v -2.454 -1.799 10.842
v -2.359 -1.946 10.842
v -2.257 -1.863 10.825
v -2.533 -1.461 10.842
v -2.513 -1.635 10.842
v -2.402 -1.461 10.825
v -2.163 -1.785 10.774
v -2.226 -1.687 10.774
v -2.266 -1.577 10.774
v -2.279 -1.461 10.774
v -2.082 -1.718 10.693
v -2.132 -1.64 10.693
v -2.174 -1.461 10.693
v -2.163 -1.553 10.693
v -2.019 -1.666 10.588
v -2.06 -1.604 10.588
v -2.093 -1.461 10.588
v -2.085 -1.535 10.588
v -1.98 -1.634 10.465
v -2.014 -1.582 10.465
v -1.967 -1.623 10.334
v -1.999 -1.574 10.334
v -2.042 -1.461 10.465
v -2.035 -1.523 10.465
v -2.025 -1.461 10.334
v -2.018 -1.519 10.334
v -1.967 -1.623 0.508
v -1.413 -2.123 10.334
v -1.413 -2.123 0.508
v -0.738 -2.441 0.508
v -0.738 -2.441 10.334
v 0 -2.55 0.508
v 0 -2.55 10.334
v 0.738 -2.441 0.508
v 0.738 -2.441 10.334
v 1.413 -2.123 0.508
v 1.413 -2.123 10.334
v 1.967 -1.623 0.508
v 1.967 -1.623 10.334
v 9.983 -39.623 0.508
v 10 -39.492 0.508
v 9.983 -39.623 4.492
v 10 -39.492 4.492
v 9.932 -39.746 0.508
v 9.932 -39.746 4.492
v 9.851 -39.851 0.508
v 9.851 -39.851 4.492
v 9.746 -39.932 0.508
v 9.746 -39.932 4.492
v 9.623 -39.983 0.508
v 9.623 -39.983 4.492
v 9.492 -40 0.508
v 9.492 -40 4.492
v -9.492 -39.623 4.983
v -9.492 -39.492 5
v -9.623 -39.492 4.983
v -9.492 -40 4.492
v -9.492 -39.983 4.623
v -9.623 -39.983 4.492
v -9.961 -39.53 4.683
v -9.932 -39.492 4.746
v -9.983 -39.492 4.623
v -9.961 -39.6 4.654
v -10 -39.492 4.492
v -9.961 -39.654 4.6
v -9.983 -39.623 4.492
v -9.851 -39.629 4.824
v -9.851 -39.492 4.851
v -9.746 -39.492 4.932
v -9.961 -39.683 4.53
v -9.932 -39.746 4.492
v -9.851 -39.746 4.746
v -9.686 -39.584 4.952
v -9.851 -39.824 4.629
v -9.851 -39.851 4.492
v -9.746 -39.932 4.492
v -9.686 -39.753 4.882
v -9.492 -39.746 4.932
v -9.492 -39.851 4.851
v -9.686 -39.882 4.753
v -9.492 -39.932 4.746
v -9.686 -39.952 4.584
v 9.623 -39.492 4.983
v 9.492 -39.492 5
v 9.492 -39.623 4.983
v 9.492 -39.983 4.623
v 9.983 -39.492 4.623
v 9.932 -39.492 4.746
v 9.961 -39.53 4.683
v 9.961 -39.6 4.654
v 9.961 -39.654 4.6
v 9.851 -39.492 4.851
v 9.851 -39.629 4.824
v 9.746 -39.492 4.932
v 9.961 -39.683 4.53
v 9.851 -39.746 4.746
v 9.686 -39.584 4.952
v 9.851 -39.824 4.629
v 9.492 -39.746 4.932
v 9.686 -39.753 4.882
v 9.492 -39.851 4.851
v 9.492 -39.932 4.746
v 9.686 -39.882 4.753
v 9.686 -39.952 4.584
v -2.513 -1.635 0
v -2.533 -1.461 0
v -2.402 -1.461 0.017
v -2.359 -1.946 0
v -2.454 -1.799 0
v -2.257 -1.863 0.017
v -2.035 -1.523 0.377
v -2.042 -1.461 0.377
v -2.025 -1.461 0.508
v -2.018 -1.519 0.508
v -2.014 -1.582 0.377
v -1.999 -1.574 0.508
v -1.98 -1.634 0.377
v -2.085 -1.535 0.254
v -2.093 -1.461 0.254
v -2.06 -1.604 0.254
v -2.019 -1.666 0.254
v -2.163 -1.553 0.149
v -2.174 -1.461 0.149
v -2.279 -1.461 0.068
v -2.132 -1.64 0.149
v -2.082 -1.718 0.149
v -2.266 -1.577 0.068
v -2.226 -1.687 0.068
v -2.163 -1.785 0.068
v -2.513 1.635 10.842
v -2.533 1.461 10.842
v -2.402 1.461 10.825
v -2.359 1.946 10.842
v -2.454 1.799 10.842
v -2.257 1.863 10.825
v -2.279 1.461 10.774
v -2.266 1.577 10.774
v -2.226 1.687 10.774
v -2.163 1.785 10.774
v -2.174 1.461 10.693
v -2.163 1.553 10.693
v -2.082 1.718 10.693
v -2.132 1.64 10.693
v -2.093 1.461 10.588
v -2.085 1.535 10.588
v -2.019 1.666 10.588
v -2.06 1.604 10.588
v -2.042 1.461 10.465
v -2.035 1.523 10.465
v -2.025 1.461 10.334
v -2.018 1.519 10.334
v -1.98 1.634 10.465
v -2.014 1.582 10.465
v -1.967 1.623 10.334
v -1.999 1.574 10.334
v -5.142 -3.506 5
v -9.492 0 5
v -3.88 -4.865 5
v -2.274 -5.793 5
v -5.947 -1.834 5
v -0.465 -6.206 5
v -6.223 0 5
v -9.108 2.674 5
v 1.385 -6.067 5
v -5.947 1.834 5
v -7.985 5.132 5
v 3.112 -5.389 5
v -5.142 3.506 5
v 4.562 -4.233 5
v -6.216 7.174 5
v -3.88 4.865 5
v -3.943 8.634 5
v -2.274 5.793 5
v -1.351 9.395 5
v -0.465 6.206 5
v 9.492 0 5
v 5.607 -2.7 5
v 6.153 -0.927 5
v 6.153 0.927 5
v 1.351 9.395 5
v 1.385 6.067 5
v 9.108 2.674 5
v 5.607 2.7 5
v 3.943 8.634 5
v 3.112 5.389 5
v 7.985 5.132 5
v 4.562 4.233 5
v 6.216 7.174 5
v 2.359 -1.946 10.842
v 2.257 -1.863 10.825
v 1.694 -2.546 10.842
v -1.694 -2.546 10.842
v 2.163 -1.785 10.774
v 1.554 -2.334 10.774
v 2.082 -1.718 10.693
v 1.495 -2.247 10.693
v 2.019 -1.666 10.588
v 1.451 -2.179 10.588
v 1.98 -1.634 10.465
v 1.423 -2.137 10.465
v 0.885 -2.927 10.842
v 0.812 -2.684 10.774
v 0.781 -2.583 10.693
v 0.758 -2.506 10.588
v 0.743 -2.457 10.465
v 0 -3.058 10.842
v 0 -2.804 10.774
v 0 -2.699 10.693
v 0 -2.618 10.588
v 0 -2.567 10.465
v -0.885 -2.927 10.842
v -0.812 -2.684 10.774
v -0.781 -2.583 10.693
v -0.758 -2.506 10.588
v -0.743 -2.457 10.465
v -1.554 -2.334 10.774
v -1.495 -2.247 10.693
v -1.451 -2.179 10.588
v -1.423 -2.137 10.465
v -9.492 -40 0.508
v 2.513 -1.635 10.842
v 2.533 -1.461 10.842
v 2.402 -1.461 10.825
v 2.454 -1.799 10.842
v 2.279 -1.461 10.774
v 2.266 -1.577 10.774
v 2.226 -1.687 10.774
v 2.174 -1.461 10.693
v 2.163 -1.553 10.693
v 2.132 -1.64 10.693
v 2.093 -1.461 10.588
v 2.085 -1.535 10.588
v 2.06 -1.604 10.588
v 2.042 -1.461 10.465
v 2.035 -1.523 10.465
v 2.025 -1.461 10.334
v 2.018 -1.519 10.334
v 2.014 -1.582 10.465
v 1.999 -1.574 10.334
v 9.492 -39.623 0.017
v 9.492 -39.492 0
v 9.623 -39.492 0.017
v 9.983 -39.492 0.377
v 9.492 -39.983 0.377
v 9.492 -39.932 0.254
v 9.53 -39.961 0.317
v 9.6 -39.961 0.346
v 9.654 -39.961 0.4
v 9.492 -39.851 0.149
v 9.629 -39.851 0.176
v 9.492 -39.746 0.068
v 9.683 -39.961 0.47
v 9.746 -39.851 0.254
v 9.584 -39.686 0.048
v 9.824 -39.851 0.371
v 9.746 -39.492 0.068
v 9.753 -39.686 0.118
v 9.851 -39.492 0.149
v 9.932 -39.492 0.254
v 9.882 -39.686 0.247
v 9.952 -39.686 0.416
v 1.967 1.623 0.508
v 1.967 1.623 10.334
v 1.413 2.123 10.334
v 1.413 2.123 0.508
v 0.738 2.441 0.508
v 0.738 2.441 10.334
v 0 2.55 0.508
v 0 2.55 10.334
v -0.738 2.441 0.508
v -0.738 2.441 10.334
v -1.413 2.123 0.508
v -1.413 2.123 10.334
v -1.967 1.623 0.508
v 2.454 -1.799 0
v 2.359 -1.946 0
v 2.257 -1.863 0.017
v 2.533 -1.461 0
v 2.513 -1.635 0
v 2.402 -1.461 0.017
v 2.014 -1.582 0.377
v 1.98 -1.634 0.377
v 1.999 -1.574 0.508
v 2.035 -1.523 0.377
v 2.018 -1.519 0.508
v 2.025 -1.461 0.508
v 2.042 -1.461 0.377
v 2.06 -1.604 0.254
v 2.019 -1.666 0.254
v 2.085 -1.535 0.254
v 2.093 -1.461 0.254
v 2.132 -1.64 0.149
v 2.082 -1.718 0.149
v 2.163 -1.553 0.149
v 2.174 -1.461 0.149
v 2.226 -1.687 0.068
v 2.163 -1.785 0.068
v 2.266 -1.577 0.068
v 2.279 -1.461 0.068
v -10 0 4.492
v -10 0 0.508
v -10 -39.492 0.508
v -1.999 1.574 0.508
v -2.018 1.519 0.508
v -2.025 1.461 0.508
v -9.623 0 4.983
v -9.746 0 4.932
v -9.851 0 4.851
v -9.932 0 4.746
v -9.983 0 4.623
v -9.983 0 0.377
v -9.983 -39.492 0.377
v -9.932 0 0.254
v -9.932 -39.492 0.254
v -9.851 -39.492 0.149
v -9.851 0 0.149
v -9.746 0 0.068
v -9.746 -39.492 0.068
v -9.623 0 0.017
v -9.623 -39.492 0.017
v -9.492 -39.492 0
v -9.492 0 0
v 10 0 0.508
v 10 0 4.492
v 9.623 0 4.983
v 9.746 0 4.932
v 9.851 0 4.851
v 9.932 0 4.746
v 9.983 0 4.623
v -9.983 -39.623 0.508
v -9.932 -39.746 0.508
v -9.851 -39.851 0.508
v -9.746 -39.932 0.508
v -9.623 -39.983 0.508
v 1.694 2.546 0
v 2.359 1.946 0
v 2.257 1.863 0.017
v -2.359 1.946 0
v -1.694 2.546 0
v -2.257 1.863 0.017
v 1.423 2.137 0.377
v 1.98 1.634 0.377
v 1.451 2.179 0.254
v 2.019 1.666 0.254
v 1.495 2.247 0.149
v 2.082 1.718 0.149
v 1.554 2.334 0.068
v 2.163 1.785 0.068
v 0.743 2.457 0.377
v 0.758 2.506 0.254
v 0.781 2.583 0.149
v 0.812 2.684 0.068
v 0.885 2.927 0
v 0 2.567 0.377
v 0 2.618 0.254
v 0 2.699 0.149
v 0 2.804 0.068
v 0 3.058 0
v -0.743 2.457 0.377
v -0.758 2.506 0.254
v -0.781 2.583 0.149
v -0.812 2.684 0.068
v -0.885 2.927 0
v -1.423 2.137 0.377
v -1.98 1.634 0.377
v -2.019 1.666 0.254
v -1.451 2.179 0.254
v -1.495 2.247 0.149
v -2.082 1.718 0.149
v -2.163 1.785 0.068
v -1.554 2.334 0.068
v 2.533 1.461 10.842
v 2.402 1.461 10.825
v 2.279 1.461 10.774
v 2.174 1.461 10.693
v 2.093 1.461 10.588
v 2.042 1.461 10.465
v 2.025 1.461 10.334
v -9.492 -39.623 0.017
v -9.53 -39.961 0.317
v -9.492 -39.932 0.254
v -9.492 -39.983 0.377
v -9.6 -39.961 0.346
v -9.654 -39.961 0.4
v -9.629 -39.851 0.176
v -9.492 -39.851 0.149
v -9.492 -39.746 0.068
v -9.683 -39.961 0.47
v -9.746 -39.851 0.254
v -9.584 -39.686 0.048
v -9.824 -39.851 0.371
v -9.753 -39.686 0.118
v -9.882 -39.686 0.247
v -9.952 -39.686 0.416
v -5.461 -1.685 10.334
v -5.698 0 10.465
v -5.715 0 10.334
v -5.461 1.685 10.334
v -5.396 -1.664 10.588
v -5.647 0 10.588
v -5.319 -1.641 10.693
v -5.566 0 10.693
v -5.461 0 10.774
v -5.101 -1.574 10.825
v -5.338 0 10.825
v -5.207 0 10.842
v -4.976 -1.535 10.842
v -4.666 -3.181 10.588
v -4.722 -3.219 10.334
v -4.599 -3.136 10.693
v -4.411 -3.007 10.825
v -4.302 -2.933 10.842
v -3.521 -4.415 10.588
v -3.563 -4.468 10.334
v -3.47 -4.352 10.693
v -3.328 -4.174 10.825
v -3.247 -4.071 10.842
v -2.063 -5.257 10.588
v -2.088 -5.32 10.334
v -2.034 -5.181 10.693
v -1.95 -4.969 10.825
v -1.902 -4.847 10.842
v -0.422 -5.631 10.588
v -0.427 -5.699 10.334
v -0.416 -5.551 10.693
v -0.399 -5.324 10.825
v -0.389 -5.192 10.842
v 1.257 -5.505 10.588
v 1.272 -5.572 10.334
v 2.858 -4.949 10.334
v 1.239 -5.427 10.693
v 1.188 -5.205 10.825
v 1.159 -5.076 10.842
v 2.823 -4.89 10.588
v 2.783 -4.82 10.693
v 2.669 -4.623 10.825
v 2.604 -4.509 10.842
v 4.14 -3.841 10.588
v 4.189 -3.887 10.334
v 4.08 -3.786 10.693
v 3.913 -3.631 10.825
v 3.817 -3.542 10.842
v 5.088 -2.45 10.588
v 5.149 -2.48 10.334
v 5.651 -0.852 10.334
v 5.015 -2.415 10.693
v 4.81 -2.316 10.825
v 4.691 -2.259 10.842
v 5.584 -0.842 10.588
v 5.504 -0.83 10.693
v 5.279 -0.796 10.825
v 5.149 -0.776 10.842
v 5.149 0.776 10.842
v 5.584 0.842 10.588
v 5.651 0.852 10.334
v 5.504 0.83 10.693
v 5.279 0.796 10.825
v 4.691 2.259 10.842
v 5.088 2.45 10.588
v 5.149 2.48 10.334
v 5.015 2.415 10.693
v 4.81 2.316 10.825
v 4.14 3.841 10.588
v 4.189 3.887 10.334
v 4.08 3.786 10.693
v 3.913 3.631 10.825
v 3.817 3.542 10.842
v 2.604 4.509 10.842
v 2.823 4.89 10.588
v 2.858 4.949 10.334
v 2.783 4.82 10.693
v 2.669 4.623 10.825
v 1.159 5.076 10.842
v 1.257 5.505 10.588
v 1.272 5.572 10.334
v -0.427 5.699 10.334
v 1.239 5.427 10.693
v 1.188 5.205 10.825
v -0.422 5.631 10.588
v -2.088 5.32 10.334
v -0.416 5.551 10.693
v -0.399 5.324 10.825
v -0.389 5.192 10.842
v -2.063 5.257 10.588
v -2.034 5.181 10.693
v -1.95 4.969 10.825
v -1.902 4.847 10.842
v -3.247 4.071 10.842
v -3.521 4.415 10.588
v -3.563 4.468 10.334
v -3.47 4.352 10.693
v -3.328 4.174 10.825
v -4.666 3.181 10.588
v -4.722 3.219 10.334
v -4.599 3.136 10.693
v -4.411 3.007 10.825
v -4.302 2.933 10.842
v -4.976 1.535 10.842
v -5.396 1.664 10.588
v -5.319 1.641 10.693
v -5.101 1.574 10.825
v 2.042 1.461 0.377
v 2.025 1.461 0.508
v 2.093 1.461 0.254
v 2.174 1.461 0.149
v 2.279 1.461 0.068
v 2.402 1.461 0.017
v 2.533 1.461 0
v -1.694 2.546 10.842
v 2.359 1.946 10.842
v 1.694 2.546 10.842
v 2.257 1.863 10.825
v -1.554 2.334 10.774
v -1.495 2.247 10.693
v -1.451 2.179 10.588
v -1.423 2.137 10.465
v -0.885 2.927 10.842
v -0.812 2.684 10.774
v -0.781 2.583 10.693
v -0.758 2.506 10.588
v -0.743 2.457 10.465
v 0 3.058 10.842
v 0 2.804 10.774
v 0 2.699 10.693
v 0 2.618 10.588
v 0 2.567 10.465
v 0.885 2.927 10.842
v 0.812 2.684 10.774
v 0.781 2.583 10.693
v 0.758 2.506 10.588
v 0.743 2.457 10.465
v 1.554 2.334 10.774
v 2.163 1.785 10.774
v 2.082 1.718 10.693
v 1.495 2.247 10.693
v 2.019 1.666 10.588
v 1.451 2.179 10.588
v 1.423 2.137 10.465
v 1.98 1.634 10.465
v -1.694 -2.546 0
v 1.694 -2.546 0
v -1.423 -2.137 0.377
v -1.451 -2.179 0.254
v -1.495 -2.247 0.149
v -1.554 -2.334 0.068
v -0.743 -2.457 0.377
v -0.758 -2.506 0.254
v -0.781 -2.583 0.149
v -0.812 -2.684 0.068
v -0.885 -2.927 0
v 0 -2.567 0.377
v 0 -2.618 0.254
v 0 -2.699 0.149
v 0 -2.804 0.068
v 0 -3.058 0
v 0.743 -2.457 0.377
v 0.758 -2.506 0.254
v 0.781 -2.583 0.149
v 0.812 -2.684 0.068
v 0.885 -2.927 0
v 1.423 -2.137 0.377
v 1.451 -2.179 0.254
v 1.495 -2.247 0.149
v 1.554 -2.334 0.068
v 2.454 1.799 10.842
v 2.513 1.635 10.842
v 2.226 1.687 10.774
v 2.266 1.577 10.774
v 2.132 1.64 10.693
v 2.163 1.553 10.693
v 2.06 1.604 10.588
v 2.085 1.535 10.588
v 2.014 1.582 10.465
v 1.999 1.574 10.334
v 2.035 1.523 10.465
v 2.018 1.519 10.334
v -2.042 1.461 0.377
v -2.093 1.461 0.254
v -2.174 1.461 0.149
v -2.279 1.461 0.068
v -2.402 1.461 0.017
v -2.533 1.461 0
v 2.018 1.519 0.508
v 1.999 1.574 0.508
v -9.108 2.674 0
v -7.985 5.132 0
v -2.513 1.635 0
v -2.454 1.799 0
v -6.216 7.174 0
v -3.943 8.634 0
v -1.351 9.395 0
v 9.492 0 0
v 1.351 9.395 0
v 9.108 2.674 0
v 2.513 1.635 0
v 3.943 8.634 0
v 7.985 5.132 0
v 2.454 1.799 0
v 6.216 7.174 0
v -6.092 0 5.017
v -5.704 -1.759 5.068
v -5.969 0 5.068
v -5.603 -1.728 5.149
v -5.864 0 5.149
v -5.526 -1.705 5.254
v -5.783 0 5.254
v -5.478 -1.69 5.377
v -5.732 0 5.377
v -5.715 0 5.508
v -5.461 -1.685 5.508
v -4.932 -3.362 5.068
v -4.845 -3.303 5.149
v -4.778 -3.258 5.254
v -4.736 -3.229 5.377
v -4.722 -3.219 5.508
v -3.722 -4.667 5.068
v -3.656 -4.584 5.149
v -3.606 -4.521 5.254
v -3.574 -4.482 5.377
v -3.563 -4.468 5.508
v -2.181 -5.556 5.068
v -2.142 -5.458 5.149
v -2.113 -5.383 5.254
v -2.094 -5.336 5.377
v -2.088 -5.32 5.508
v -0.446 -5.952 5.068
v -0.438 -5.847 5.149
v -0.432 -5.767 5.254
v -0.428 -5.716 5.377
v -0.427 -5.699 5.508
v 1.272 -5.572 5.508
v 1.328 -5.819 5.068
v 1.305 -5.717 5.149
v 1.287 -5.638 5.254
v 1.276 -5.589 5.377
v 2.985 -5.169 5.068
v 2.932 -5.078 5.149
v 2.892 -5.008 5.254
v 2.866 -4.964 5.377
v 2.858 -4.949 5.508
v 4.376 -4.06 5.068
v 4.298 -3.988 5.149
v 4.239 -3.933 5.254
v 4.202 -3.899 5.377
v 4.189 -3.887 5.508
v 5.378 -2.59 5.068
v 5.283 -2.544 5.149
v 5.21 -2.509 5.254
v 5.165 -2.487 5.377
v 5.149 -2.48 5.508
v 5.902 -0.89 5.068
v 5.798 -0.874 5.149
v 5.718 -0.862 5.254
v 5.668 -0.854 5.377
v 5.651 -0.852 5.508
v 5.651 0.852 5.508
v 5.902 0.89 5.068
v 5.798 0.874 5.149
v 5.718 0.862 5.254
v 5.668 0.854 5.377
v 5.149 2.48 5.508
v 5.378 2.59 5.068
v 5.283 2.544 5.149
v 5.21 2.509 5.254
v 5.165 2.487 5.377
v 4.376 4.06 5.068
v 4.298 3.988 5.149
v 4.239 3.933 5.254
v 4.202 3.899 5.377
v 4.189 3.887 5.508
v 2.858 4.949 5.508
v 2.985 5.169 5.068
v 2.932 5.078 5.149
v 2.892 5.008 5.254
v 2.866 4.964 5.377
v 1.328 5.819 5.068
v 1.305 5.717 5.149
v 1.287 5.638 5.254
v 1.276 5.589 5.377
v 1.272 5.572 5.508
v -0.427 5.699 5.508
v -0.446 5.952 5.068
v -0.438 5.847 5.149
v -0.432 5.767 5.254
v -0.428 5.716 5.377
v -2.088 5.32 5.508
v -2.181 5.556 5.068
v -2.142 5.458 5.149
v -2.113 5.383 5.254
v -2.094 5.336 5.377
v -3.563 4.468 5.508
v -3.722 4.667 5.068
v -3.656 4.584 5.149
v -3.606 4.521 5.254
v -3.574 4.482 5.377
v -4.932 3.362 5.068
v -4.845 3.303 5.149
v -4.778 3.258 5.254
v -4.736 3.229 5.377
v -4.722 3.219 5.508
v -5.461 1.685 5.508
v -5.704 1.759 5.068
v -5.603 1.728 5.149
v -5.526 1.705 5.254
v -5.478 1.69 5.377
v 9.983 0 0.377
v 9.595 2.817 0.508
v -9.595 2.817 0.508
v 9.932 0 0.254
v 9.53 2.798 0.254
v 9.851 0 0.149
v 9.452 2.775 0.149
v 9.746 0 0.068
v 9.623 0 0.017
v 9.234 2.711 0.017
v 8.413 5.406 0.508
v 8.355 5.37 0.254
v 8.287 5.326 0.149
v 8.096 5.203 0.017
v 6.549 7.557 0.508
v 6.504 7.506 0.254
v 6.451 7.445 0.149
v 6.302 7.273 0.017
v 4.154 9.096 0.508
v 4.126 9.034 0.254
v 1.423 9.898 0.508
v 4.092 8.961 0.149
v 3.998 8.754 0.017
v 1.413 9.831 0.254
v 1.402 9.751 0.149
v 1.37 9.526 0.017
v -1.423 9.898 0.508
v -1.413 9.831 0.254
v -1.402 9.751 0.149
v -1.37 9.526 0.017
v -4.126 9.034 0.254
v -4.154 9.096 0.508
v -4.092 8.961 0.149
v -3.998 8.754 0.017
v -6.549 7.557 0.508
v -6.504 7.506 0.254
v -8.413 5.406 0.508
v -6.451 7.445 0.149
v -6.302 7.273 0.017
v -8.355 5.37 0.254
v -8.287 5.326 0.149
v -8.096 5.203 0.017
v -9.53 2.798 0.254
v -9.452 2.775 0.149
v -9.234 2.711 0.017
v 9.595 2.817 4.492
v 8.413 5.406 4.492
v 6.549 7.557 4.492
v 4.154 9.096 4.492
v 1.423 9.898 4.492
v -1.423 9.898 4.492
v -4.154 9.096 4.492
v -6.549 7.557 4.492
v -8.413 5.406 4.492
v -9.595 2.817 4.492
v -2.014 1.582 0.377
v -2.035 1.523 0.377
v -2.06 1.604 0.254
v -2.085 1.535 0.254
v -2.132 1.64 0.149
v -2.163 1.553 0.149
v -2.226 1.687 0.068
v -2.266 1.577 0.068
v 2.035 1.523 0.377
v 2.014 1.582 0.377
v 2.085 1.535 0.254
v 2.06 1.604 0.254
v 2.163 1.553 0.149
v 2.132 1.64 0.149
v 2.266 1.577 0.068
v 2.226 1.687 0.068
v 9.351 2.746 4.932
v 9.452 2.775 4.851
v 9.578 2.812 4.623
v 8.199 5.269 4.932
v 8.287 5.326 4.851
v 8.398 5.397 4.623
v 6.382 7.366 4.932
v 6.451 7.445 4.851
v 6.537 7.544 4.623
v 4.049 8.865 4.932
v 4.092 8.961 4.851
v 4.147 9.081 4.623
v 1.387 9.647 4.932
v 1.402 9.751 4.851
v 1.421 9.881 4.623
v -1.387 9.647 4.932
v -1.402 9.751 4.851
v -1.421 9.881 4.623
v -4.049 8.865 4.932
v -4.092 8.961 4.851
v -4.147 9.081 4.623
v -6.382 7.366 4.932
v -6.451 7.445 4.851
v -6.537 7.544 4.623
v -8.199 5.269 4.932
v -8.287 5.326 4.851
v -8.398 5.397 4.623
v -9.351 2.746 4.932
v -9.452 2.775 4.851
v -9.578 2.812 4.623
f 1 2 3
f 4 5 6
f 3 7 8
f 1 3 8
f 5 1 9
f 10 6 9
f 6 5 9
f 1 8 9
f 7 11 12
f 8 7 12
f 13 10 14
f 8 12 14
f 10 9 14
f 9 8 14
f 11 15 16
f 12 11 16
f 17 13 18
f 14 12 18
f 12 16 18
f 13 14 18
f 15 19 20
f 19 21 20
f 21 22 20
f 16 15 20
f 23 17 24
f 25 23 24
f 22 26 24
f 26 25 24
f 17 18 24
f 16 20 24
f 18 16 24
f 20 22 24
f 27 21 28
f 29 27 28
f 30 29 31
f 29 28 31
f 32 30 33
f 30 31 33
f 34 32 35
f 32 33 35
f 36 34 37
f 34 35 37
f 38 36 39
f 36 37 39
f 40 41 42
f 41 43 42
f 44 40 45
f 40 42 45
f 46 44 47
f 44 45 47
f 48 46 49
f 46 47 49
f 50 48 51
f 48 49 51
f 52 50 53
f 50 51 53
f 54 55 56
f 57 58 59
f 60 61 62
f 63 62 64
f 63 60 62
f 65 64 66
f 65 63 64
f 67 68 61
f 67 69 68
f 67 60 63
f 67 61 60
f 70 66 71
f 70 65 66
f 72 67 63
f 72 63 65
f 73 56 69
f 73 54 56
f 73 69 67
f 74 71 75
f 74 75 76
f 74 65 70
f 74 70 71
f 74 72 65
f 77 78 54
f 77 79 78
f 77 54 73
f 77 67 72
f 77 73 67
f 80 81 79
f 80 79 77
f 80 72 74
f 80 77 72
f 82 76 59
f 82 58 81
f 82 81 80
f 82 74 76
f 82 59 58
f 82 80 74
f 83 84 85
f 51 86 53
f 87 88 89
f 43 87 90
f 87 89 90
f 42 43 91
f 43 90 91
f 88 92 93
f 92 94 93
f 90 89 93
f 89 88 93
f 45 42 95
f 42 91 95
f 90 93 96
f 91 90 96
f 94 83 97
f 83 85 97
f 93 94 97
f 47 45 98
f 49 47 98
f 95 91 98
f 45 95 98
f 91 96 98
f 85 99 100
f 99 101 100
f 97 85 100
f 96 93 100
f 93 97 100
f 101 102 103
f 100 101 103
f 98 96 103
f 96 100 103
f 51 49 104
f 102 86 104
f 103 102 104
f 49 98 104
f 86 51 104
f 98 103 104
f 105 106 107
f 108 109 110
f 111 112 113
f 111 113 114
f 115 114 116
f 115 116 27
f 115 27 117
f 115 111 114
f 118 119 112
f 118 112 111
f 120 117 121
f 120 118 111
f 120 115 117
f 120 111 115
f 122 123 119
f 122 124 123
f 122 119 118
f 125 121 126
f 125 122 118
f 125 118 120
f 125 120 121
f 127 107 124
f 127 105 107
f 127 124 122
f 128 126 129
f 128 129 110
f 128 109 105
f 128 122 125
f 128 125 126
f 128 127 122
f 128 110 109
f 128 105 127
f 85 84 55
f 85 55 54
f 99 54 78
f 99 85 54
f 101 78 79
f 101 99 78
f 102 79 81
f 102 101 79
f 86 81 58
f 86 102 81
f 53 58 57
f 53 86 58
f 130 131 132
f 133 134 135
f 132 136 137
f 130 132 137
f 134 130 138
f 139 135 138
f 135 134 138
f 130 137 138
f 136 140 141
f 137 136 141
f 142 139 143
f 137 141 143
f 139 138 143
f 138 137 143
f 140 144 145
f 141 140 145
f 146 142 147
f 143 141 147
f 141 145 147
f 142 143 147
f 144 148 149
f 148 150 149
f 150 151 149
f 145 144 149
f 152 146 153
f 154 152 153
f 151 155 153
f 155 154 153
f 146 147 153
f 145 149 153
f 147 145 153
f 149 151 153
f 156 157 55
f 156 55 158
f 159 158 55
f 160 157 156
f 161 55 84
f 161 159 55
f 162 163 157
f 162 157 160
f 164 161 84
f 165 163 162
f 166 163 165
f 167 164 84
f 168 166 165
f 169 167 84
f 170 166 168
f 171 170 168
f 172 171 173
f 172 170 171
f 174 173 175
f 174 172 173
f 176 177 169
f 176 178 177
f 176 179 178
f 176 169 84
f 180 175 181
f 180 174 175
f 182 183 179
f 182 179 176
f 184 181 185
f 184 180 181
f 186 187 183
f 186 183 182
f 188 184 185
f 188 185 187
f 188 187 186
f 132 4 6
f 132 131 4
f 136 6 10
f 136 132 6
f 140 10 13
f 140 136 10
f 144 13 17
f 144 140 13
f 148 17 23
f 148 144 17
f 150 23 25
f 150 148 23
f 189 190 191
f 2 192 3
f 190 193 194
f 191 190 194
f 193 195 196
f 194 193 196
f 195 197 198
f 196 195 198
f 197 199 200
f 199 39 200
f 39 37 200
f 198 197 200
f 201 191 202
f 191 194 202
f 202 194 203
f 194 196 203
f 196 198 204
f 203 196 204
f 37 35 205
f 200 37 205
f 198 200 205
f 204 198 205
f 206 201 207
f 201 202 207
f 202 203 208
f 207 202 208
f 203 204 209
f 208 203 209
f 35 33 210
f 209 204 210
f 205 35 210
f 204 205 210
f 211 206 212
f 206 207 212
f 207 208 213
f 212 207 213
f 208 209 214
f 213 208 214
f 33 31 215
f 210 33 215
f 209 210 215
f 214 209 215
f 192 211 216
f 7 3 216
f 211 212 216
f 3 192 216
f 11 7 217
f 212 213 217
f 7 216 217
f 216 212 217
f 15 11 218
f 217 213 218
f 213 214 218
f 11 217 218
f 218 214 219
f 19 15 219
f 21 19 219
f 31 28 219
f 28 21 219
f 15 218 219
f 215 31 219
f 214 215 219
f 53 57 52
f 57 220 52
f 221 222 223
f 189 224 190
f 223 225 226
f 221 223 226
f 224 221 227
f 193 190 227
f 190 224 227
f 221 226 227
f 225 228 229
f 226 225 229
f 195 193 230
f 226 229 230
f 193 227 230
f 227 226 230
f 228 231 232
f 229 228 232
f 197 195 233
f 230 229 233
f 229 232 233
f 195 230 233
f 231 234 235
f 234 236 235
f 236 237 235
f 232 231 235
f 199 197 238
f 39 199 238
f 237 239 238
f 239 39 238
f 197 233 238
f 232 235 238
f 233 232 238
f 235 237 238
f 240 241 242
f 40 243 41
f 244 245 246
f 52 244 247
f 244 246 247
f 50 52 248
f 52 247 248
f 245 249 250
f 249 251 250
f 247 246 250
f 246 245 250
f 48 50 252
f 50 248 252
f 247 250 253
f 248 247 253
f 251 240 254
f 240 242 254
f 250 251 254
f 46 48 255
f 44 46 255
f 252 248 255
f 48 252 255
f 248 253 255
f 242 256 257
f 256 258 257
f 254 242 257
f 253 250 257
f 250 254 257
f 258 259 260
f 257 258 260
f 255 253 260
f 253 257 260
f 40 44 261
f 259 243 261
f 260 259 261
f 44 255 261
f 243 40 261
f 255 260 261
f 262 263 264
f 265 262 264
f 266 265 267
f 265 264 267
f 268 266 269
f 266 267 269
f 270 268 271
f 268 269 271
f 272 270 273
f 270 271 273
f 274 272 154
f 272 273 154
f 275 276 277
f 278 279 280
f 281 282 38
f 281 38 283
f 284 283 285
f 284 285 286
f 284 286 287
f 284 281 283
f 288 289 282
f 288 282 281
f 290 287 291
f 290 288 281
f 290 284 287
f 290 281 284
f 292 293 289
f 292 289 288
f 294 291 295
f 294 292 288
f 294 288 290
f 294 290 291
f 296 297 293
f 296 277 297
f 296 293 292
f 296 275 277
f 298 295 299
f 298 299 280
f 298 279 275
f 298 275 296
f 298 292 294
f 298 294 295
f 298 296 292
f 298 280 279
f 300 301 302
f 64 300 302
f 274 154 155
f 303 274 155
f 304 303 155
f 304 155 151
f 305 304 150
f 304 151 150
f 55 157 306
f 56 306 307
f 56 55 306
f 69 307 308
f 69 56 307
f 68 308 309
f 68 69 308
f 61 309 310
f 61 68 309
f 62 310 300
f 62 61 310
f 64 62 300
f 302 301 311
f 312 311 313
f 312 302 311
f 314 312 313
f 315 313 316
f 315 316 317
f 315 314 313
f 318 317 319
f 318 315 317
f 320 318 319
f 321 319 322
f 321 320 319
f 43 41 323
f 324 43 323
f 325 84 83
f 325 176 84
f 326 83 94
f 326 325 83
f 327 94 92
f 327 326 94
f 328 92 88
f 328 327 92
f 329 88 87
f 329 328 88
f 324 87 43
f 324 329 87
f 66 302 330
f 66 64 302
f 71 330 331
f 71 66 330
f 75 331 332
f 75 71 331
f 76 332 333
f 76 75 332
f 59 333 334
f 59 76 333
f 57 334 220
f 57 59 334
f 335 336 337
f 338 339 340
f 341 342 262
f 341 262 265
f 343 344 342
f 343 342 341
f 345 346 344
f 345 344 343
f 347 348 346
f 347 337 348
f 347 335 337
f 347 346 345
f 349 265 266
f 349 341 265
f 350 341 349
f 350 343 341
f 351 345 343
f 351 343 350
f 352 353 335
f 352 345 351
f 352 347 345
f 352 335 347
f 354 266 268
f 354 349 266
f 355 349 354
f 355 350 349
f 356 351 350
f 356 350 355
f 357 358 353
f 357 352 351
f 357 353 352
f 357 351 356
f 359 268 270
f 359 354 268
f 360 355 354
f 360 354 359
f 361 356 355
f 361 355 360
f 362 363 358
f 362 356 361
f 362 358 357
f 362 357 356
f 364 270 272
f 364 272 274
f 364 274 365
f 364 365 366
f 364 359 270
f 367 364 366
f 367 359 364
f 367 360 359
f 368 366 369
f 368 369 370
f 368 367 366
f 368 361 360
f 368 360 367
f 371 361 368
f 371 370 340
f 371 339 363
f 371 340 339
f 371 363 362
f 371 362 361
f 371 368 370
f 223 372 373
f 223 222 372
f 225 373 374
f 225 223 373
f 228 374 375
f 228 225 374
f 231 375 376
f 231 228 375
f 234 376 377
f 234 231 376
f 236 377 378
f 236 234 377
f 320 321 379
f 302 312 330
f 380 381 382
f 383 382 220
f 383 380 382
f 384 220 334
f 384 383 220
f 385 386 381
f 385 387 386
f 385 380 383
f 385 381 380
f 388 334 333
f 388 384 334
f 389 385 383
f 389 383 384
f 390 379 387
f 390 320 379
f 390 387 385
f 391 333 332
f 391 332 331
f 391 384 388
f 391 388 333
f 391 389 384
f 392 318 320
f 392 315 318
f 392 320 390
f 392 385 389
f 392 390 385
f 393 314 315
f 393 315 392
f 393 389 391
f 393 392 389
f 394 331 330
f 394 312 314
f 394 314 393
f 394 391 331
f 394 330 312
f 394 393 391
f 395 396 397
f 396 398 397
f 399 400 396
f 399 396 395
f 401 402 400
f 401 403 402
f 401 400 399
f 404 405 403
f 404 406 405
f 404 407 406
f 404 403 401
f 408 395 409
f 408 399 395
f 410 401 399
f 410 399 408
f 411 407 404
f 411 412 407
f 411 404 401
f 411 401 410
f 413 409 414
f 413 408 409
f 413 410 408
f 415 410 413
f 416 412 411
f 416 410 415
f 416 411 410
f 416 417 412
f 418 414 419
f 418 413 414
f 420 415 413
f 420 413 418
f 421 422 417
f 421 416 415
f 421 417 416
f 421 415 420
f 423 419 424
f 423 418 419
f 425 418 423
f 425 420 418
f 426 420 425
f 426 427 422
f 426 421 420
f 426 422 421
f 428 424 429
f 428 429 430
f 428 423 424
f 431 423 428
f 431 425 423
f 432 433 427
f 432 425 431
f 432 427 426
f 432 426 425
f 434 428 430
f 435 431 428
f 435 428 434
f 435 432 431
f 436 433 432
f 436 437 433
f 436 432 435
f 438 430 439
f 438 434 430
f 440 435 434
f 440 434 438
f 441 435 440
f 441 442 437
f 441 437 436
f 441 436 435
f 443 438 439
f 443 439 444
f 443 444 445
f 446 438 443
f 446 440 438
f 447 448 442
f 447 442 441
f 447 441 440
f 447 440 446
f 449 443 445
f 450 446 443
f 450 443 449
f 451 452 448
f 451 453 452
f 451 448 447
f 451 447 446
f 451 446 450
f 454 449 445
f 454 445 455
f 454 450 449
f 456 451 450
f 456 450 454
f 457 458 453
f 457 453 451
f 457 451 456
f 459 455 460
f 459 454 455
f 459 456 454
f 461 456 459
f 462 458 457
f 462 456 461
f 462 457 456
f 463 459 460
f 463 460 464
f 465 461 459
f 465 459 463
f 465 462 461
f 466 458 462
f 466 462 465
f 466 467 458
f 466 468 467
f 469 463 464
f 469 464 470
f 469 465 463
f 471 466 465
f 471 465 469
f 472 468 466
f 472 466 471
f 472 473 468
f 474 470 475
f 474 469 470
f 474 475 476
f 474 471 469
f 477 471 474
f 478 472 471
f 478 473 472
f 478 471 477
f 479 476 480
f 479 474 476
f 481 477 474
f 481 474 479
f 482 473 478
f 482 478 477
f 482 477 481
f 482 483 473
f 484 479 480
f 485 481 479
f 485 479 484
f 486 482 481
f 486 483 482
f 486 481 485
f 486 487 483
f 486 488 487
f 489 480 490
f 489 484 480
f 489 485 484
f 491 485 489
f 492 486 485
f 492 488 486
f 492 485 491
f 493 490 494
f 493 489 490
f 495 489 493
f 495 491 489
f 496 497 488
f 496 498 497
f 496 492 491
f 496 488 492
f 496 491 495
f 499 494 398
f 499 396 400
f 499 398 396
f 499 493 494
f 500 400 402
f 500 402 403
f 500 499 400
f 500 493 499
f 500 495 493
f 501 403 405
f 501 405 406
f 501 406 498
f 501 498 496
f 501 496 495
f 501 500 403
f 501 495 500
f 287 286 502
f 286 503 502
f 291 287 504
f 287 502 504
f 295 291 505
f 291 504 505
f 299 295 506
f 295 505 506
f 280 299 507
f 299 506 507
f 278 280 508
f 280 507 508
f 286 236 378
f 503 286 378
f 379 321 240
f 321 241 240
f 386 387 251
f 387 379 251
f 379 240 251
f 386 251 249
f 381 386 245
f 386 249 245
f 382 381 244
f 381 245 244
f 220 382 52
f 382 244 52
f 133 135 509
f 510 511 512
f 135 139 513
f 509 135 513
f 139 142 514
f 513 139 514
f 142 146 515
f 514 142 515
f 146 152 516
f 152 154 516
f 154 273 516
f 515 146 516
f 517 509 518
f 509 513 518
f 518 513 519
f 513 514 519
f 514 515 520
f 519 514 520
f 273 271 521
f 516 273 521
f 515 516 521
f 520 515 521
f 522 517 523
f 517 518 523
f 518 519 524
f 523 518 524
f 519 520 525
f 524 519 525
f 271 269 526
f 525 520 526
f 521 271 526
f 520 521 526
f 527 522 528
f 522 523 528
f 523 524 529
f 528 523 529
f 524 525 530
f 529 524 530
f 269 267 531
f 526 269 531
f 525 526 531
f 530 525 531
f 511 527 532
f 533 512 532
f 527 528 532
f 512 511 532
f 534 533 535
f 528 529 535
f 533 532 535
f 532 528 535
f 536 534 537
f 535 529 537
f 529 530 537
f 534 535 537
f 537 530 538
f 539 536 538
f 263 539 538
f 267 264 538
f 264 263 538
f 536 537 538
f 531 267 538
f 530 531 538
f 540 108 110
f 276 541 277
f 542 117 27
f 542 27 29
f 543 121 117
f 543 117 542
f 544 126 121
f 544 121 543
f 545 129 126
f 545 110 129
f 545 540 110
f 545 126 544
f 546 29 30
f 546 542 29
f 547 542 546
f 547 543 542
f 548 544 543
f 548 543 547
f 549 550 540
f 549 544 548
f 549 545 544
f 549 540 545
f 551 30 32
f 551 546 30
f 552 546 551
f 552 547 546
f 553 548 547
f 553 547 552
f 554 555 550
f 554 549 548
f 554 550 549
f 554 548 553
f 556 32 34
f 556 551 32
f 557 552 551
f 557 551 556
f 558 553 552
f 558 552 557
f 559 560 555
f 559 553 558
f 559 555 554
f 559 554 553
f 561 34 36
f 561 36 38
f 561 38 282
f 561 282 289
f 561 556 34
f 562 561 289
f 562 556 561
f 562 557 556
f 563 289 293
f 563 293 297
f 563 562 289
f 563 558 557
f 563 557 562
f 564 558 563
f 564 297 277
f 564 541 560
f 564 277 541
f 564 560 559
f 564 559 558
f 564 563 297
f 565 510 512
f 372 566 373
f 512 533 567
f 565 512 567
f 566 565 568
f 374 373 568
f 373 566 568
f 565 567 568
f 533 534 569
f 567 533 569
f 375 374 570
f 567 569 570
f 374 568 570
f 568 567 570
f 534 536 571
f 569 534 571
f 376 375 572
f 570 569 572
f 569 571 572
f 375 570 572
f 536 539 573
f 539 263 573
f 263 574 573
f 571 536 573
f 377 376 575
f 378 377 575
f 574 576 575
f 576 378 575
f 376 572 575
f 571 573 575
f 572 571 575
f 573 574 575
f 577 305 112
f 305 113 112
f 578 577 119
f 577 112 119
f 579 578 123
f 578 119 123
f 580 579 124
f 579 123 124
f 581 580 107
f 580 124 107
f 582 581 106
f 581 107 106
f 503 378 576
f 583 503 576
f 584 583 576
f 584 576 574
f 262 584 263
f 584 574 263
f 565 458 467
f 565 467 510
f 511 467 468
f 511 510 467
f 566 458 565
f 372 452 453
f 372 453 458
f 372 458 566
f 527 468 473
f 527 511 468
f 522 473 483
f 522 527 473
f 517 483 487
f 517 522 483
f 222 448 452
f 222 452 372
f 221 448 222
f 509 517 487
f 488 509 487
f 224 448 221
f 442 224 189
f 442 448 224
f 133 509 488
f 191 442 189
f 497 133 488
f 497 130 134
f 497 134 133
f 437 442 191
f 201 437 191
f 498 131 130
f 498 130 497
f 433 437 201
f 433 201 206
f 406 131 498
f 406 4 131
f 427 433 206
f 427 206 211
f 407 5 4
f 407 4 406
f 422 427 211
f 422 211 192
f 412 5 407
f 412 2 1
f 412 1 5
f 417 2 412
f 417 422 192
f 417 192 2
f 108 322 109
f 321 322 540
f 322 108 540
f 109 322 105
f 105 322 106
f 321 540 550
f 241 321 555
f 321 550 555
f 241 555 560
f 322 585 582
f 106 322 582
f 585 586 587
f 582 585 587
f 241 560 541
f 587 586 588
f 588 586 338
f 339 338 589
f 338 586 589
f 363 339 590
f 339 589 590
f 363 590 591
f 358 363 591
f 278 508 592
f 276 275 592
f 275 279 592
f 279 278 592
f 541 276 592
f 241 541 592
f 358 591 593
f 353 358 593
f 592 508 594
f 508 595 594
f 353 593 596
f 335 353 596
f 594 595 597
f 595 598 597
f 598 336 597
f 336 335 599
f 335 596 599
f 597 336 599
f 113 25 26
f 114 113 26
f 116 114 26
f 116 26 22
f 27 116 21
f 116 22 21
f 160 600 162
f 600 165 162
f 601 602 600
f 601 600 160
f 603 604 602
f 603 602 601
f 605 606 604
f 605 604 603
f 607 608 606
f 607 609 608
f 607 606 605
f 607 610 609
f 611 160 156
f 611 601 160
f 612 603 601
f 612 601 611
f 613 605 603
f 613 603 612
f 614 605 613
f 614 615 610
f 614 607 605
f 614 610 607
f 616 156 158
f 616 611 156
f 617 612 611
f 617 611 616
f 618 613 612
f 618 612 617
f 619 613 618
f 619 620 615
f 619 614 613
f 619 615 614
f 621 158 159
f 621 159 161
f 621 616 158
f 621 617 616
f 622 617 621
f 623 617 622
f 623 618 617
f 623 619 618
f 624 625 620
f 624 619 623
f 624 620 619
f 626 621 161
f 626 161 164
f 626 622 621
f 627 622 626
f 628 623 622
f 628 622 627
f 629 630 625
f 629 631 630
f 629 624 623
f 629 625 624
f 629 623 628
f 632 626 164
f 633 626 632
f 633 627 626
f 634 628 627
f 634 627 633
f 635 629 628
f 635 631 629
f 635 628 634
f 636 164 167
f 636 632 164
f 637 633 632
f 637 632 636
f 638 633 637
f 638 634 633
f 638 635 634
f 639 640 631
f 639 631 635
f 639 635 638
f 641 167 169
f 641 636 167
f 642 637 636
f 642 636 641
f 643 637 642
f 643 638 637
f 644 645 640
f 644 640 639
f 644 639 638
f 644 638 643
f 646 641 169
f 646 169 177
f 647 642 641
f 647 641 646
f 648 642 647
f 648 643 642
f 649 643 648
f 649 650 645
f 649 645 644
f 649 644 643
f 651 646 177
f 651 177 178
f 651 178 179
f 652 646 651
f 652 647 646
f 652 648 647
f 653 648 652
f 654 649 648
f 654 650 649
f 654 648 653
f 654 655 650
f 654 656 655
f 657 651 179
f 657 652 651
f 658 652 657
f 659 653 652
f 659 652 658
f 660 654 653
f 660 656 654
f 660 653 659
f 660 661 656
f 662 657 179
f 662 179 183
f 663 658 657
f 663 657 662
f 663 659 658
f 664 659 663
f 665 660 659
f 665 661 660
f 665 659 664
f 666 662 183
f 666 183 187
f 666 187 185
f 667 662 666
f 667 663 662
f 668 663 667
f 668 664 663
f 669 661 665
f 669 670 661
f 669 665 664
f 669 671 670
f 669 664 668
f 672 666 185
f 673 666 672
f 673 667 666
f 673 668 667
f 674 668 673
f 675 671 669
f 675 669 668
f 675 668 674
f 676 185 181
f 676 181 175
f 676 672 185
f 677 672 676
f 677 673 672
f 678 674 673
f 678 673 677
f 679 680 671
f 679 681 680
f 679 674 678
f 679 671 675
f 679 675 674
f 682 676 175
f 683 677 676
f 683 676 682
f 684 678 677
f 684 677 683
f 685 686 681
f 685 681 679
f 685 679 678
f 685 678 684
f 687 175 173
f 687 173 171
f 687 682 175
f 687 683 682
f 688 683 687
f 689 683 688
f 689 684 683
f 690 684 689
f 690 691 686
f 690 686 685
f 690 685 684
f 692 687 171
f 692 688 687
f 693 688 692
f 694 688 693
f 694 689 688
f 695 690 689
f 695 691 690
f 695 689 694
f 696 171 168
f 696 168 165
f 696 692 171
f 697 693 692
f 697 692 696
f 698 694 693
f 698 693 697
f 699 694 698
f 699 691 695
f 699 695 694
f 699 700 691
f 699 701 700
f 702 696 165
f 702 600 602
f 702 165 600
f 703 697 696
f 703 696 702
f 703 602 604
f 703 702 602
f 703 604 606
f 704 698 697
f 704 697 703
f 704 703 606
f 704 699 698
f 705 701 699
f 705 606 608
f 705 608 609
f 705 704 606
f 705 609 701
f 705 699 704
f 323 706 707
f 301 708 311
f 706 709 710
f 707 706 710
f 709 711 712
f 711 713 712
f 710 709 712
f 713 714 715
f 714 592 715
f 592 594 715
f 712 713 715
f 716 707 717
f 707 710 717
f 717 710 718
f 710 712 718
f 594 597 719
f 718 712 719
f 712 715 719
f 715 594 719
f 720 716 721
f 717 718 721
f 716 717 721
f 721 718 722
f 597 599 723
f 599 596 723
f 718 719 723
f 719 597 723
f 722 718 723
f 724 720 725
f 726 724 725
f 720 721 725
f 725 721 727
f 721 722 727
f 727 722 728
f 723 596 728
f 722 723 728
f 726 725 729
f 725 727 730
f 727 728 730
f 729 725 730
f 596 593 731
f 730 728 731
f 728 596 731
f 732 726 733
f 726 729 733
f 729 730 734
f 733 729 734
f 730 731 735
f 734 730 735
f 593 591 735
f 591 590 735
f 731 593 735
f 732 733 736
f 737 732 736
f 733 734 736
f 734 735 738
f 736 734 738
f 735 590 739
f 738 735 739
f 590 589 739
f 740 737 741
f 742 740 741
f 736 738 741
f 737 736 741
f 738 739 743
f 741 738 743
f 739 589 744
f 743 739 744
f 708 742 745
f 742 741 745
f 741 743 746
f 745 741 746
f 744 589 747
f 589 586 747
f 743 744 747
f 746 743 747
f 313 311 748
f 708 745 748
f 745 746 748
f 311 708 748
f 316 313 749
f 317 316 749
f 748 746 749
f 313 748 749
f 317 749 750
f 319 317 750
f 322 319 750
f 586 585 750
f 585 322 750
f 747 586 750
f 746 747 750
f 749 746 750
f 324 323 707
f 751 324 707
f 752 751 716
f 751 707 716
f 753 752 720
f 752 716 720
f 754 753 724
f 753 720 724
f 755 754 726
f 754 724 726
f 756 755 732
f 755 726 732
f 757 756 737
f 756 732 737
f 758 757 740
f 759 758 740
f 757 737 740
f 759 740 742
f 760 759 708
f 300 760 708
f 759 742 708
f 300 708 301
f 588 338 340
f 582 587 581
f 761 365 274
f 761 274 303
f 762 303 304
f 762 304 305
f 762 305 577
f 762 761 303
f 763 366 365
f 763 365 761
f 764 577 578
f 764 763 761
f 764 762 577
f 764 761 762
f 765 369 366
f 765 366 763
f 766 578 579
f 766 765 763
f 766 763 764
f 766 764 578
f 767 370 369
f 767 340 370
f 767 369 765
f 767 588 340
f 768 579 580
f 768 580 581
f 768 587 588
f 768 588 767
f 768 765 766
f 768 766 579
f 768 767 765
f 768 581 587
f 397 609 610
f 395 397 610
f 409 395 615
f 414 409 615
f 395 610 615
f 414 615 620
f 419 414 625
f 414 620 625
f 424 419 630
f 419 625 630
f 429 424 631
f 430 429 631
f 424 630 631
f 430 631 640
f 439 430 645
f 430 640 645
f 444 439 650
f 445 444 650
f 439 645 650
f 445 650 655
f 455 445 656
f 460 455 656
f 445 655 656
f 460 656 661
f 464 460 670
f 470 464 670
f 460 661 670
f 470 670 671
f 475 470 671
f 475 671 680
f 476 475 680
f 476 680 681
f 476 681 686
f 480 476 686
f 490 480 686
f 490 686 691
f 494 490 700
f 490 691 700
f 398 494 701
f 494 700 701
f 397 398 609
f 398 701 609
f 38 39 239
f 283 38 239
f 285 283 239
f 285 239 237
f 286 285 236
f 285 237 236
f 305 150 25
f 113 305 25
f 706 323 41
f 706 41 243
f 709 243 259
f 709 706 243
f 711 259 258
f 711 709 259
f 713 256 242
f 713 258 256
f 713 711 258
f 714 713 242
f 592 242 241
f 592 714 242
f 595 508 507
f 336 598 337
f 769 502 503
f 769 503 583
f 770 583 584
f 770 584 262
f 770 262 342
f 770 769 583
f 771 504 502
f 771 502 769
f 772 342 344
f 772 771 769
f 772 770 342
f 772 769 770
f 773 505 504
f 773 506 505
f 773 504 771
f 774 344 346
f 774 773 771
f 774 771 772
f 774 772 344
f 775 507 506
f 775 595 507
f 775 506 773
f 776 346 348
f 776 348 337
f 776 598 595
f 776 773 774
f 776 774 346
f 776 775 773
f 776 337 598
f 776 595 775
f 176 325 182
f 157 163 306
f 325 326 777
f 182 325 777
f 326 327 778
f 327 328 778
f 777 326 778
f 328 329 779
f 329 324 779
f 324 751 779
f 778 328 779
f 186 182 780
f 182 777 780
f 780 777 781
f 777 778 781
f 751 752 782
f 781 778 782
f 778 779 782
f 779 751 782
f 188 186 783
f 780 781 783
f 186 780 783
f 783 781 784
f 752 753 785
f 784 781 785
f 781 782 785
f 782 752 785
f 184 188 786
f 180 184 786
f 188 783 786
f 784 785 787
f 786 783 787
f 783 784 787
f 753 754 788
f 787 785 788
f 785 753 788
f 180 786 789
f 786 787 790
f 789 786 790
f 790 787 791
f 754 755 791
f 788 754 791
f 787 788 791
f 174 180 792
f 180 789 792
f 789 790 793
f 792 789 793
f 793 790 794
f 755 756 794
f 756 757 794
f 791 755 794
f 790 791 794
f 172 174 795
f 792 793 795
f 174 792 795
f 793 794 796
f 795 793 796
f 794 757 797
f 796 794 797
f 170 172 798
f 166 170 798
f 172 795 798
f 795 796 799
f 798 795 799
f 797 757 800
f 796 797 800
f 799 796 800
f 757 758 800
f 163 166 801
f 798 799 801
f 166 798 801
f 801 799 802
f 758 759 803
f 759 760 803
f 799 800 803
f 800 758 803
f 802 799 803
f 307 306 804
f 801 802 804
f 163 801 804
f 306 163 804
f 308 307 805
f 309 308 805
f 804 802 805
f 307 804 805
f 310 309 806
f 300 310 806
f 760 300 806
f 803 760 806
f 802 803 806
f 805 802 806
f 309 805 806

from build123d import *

# Parameters (mm, degrees)
BOSS_EXTRUDE1_DEPTH = 5
SKETCH2_R           = 5.715
BOSS_EXTRUDE2_DEPTH = 5.842
CUT_EXTRUDE1_REACH  = 43.643
FILLET1_R           = 0.508


with BuildPart() as part:
    # Sketch1 → Boss-Extrude1 (new body)
    with BuildSketch(Plane.XY):
        with BuildLine():
            Line((-10, 0), (-10, -40))
            Line((-10, -40), (10, -40))
            Line((10, -40), (10, 0))
            ThreePointArc((10, 0), (0, 10), (-10, 0))
        make_face()
    extrude(amount=BOSS_EXTRUDE1_DEPTH)

    # Sketch2 → Boss-Extrude2 (add)
    with BuildSketch(Plane.XY.offset(5)):
        with Locations(Location((0, 0, 0), (0, 0, 180))):
            Circle(SKETCH2_R)
        with BuildLine():
            Line((2.025, 1.461223802), (2.025, -1.461223802))
            ThreePointArc((2.025, -1.461223802), (2.010039605, -1.547107835), (1.966920732, -1.622874867))
            ThreePointArc((1.966920732, -1.622874867), (0, -2.55), (-1.966920732, -1.622874867))
            ThreePointArc((-1.966920732, -1.622874867), (-2.010039605, -1.547107835), (-2.025, -1.461223802))
            Line((-2.025, -1.461223802), (-2.025, 1.461223802))
            ThreePointArc((-2.025, 1.461223802), (-2.010039605, 1.547107835), (-1.966920732, 1.622874867))
            ThreePointArc((-1.966920732, 1.622874867), (0, 2.55), (1.966920732, 1.622874867))
            ThreePointArc((1.966920732, 1.622874867), (2.010039605, 1.547107835), (2.025, 1.461223802))
        make_face(mode=Mode.SUBTRACT)
    extrude(amount=BOSS_EXTRUDE2_DEPTH)

    # Sketch3 → Cut-Extrude1 (cut, up to next)
    with BuildSketch(Plane.XY.offset(5), mode=Mode.PRIVATE) as cut_extrude1_sk1:
        with BuildLine():
            Line((-2.025, 1.461223802), (-2.025, -1.461223802))
            ThreePointArc((-2.025, -1.461223802), (-2.010039605, -1.547107835), (-1.966920732, -1.622874867))
            ThreePointArc((-1.966920732, -1.622874867), (0, -2.55), (1.966920732, -1.622874867))
            ThreePointArc((1.966920732, -1.622874867), (2.010039605, -1.547107835), (2.025, -1.461223802))
            Line((2.025, -1.461223802), (2.025, 1.461223802))
            ThreePointArc((2.025, 1.461223802), (2.010039605, 1.547107835), (1.966920732, 1.622874867))
            ThreePointArc((1.966920732, 1.622874867), (0, 2.55), (-1.966920732, 1.622874867))
            ThreePointArc((-1.966920732, 1.622874867), (-2.010039605, 1.547107835), (-2.025, 1.461223802))
        make_face()
    cut_extrude1_tool1 = extrude(cut_extrude1_sk1.sketch, amount=-CUT_EXTRUDE1_REACH, mode=Mode.PRIVATE) & part.part
    add(cut_extrude1_tool1.solids().sort_by_distance((0, 0, 5))[0], mode=Mode.SUBTRACT)

    # Fillet1
    fillet1_edges = [part.edges().sort_by_distance(p)[0] for p in [
        (0, -40, 5),
        (10, -20, 5),
        (5.715, 0, 5),
        (5.715, 0, 10.842),
        (-2.010039605, -1.547107835, 10.842),
        (0, -2.55, 10.842),
        (2.010039605, -1.547107835, 10.842),
        (2.025, 0, 10.842),
        (2.010039605, 1.547107835, 10.842),
        (0, 2.55, 10.842),
        (-2.010039605, 1.547107835, 10.842),
        (-2.025, 0, 10.842),
        (-2.010039605, 1.547107835, 0),
        (0, 2.55, 0),
        (2.010039605, 1.547107835, 0),
        (2.025, 0, 0),
        (2.010039605, -1.547107835, 0),
        (0, -2.55, 0),
        (-2.010039605, -1.547107835, 0),
        (-2.025, 0, 0),
        (0, 10, 5),
        (10, -20, 0),
        (0, -40, 0),
        (-10, -20, 0),
        (0, 10, 0),
        (10, -40, 2.5),
        (-10, -40, 2.5),
        (-10, -20, 5),
    ]]
    fillet(fillet1_edges, radius=FILLET1_R)


solid = part.part
